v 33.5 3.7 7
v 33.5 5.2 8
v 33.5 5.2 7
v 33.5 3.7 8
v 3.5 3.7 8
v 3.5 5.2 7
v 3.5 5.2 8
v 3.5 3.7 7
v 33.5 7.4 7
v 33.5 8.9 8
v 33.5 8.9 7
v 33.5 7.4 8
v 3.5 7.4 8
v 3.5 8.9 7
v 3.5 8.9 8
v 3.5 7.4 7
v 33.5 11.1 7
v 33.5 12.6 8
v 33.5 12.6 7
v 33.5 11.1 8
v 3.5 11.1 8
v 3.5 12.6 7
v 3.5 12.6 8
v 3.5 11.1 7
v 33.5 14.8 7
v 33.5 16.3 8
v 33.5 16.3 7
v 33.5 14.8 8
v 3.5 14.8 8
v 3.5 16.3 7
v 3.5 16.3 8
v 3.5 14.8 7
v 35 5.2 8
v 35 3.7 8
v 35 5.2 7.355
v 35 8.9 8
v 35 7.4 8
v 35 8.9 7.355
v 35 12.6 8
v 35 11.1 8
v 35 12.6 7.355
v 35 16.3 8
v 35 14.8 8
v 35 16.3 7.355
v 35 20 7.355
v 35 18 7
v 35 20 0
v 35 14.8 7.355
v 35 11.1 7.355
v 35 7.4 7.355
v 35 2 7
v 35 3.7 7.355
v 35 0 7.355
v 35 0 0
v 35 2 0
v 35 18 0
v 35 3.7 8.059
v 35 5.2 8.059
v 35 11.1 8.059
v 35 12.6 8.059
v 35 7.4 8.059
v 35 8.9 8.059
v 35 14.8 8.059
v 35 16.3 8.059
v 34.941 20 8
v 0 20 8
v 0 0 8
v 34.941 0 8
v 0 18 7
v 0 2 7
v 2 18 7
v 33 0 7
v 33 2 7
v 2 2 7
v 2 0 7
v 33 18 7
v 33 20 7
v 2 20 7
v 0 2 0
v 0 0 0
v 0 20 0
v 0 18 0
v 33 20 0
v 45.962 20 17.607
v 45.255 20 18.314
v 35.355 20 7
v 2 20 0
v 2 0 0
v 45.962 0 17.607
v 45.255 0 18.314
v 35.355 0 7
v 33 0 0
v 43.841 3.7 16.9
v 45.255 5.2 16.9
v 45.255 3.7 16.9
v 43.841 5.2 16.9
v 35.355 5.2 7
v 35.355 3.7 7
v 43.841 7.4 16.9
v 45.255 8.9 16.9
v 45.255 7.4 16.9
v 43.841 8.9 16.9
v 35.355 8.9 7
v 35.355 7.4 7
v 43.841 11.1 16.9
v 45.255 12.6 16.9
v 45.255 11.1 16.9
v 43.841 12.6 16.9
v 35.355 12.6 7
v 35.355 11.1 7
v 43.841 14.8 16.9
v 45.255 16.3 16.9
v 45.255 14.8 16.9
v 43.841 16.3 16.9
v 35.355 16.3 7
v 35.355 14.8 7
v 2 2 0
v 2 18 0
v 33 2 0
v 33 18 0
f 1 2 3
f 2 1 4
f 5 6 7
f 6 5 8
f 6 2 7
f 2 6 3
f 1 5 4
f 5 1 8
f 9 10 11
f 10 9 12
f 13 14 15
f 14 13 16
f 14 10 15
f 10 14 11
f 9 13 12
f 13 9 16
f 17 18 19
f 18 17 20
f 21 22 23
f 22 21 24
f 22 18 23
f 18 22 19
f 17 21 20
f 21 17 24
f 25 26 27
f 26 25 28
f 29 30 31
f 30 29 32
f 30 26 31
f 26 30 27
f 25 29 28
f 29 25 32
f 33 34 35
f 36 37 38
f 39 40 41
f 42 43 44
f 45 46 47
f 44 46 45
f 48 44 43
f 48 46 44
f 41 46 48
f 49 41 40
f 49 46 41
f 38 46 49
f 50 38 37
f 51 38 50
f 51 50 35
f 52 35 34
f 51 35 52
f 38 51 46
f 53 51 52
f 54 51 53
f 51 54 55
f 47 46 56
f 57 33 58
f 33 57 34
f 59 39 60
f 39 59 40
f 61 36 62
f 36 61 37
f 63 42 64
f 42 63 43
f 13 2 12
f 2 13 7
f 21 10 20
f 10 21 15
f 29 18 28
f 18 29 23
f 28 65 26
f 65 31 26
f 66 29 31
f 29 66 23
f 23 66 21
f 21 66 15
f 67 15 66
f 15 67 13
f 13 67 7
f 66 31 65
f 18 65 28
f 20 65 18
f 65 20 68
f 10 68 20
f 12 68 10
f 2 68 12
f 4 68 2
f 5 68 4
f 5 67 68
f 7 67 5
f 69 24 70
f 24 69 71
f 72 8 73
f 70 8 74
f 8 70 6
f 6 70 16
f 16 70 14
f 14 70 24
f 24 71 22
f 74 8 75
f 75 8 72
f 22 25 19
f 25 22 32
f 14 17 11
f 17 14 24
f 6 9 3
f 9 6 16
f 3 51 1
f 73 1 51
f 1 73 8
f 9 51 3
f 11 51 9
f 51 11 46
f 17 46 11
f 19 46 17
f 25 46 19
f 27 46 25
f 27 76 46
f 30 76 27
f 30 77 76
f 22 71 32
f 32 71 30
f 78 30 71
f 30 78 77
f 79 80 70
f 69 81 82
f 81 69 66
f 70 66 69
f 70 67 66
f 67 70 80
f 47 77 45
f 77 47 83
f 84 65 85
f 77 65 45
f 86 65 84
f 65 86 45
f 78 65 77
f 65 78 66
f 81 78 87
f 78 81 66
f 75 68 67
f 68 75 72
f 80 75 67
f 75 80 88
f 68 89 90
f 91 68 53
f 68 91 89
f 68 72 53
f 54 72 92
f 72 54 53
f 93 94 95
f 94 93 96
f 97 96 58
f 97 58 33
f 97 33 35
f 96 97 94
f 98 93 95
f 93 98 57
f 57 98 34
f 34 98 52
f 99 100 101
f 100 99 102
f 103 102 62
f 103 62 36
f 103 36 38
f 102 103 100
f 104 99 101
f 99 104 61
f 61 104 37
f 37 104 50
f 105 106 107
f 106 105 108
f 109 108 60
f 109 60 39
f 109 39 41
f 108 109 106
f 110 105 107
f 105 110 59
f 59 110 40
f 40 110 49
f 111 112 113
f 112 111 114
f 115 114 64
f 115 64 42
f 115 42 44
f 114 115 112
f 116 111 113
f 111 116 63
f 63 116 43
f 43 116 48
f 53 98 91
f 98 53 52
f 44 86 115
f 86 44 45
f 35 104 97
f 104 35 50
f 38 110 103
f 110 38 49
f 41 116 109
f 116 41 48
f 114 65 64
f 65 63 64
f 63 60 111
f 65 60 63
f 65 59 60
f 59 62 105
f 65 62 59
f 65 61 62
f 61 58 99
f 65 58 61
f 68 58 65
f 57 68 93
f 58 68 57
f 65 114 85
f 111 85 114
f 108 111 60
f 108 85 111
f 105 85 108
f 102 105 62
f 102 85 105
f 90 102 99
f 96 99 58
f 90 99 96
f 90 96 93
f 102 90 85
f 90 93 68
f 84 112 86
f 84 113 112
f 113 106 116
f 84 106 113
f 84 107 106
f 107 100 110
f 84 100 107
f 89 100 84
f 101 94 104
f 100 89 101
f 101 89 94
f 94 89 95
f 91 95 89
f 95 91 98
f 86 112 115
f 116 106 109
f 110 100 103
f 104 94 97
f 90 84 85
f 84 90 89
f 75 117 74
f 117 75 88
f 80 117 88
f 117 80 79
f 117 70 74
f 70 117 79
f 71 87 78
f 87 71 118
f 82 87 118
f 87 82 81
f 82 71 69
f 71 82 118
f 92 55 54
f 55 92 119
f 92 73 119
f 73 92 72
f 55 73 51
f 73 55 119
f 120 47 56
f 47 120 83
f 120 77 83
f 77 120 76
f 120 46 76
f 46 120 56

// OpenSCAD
translate ([0,0,7]) {
//решётка
difference () {
cube ([35,20,1]);
for ( i = [1 : 4] ) {
translate ([3.5,3.7*i,-0.1])cube ( [30,1.5,2.5] ) ;
}
}
difference () {
rotate ([0,-45,0])translate ([25,0,-25])cube ([15,20,1]);
#for ( i = [1 : 4] ) {
translate ([35,3.7*i,-0.1])cube ( [30,1.5,10] ) ;
}
}
translate ([0,0,-7])cube ([2,2,7]);
translate ([0,18,-7])cube ([2,2,7]);
translate ([33,0,-7])cube ([2,2,7]);
translate ([33,18,-7])cube ([2,2,7]);
}
